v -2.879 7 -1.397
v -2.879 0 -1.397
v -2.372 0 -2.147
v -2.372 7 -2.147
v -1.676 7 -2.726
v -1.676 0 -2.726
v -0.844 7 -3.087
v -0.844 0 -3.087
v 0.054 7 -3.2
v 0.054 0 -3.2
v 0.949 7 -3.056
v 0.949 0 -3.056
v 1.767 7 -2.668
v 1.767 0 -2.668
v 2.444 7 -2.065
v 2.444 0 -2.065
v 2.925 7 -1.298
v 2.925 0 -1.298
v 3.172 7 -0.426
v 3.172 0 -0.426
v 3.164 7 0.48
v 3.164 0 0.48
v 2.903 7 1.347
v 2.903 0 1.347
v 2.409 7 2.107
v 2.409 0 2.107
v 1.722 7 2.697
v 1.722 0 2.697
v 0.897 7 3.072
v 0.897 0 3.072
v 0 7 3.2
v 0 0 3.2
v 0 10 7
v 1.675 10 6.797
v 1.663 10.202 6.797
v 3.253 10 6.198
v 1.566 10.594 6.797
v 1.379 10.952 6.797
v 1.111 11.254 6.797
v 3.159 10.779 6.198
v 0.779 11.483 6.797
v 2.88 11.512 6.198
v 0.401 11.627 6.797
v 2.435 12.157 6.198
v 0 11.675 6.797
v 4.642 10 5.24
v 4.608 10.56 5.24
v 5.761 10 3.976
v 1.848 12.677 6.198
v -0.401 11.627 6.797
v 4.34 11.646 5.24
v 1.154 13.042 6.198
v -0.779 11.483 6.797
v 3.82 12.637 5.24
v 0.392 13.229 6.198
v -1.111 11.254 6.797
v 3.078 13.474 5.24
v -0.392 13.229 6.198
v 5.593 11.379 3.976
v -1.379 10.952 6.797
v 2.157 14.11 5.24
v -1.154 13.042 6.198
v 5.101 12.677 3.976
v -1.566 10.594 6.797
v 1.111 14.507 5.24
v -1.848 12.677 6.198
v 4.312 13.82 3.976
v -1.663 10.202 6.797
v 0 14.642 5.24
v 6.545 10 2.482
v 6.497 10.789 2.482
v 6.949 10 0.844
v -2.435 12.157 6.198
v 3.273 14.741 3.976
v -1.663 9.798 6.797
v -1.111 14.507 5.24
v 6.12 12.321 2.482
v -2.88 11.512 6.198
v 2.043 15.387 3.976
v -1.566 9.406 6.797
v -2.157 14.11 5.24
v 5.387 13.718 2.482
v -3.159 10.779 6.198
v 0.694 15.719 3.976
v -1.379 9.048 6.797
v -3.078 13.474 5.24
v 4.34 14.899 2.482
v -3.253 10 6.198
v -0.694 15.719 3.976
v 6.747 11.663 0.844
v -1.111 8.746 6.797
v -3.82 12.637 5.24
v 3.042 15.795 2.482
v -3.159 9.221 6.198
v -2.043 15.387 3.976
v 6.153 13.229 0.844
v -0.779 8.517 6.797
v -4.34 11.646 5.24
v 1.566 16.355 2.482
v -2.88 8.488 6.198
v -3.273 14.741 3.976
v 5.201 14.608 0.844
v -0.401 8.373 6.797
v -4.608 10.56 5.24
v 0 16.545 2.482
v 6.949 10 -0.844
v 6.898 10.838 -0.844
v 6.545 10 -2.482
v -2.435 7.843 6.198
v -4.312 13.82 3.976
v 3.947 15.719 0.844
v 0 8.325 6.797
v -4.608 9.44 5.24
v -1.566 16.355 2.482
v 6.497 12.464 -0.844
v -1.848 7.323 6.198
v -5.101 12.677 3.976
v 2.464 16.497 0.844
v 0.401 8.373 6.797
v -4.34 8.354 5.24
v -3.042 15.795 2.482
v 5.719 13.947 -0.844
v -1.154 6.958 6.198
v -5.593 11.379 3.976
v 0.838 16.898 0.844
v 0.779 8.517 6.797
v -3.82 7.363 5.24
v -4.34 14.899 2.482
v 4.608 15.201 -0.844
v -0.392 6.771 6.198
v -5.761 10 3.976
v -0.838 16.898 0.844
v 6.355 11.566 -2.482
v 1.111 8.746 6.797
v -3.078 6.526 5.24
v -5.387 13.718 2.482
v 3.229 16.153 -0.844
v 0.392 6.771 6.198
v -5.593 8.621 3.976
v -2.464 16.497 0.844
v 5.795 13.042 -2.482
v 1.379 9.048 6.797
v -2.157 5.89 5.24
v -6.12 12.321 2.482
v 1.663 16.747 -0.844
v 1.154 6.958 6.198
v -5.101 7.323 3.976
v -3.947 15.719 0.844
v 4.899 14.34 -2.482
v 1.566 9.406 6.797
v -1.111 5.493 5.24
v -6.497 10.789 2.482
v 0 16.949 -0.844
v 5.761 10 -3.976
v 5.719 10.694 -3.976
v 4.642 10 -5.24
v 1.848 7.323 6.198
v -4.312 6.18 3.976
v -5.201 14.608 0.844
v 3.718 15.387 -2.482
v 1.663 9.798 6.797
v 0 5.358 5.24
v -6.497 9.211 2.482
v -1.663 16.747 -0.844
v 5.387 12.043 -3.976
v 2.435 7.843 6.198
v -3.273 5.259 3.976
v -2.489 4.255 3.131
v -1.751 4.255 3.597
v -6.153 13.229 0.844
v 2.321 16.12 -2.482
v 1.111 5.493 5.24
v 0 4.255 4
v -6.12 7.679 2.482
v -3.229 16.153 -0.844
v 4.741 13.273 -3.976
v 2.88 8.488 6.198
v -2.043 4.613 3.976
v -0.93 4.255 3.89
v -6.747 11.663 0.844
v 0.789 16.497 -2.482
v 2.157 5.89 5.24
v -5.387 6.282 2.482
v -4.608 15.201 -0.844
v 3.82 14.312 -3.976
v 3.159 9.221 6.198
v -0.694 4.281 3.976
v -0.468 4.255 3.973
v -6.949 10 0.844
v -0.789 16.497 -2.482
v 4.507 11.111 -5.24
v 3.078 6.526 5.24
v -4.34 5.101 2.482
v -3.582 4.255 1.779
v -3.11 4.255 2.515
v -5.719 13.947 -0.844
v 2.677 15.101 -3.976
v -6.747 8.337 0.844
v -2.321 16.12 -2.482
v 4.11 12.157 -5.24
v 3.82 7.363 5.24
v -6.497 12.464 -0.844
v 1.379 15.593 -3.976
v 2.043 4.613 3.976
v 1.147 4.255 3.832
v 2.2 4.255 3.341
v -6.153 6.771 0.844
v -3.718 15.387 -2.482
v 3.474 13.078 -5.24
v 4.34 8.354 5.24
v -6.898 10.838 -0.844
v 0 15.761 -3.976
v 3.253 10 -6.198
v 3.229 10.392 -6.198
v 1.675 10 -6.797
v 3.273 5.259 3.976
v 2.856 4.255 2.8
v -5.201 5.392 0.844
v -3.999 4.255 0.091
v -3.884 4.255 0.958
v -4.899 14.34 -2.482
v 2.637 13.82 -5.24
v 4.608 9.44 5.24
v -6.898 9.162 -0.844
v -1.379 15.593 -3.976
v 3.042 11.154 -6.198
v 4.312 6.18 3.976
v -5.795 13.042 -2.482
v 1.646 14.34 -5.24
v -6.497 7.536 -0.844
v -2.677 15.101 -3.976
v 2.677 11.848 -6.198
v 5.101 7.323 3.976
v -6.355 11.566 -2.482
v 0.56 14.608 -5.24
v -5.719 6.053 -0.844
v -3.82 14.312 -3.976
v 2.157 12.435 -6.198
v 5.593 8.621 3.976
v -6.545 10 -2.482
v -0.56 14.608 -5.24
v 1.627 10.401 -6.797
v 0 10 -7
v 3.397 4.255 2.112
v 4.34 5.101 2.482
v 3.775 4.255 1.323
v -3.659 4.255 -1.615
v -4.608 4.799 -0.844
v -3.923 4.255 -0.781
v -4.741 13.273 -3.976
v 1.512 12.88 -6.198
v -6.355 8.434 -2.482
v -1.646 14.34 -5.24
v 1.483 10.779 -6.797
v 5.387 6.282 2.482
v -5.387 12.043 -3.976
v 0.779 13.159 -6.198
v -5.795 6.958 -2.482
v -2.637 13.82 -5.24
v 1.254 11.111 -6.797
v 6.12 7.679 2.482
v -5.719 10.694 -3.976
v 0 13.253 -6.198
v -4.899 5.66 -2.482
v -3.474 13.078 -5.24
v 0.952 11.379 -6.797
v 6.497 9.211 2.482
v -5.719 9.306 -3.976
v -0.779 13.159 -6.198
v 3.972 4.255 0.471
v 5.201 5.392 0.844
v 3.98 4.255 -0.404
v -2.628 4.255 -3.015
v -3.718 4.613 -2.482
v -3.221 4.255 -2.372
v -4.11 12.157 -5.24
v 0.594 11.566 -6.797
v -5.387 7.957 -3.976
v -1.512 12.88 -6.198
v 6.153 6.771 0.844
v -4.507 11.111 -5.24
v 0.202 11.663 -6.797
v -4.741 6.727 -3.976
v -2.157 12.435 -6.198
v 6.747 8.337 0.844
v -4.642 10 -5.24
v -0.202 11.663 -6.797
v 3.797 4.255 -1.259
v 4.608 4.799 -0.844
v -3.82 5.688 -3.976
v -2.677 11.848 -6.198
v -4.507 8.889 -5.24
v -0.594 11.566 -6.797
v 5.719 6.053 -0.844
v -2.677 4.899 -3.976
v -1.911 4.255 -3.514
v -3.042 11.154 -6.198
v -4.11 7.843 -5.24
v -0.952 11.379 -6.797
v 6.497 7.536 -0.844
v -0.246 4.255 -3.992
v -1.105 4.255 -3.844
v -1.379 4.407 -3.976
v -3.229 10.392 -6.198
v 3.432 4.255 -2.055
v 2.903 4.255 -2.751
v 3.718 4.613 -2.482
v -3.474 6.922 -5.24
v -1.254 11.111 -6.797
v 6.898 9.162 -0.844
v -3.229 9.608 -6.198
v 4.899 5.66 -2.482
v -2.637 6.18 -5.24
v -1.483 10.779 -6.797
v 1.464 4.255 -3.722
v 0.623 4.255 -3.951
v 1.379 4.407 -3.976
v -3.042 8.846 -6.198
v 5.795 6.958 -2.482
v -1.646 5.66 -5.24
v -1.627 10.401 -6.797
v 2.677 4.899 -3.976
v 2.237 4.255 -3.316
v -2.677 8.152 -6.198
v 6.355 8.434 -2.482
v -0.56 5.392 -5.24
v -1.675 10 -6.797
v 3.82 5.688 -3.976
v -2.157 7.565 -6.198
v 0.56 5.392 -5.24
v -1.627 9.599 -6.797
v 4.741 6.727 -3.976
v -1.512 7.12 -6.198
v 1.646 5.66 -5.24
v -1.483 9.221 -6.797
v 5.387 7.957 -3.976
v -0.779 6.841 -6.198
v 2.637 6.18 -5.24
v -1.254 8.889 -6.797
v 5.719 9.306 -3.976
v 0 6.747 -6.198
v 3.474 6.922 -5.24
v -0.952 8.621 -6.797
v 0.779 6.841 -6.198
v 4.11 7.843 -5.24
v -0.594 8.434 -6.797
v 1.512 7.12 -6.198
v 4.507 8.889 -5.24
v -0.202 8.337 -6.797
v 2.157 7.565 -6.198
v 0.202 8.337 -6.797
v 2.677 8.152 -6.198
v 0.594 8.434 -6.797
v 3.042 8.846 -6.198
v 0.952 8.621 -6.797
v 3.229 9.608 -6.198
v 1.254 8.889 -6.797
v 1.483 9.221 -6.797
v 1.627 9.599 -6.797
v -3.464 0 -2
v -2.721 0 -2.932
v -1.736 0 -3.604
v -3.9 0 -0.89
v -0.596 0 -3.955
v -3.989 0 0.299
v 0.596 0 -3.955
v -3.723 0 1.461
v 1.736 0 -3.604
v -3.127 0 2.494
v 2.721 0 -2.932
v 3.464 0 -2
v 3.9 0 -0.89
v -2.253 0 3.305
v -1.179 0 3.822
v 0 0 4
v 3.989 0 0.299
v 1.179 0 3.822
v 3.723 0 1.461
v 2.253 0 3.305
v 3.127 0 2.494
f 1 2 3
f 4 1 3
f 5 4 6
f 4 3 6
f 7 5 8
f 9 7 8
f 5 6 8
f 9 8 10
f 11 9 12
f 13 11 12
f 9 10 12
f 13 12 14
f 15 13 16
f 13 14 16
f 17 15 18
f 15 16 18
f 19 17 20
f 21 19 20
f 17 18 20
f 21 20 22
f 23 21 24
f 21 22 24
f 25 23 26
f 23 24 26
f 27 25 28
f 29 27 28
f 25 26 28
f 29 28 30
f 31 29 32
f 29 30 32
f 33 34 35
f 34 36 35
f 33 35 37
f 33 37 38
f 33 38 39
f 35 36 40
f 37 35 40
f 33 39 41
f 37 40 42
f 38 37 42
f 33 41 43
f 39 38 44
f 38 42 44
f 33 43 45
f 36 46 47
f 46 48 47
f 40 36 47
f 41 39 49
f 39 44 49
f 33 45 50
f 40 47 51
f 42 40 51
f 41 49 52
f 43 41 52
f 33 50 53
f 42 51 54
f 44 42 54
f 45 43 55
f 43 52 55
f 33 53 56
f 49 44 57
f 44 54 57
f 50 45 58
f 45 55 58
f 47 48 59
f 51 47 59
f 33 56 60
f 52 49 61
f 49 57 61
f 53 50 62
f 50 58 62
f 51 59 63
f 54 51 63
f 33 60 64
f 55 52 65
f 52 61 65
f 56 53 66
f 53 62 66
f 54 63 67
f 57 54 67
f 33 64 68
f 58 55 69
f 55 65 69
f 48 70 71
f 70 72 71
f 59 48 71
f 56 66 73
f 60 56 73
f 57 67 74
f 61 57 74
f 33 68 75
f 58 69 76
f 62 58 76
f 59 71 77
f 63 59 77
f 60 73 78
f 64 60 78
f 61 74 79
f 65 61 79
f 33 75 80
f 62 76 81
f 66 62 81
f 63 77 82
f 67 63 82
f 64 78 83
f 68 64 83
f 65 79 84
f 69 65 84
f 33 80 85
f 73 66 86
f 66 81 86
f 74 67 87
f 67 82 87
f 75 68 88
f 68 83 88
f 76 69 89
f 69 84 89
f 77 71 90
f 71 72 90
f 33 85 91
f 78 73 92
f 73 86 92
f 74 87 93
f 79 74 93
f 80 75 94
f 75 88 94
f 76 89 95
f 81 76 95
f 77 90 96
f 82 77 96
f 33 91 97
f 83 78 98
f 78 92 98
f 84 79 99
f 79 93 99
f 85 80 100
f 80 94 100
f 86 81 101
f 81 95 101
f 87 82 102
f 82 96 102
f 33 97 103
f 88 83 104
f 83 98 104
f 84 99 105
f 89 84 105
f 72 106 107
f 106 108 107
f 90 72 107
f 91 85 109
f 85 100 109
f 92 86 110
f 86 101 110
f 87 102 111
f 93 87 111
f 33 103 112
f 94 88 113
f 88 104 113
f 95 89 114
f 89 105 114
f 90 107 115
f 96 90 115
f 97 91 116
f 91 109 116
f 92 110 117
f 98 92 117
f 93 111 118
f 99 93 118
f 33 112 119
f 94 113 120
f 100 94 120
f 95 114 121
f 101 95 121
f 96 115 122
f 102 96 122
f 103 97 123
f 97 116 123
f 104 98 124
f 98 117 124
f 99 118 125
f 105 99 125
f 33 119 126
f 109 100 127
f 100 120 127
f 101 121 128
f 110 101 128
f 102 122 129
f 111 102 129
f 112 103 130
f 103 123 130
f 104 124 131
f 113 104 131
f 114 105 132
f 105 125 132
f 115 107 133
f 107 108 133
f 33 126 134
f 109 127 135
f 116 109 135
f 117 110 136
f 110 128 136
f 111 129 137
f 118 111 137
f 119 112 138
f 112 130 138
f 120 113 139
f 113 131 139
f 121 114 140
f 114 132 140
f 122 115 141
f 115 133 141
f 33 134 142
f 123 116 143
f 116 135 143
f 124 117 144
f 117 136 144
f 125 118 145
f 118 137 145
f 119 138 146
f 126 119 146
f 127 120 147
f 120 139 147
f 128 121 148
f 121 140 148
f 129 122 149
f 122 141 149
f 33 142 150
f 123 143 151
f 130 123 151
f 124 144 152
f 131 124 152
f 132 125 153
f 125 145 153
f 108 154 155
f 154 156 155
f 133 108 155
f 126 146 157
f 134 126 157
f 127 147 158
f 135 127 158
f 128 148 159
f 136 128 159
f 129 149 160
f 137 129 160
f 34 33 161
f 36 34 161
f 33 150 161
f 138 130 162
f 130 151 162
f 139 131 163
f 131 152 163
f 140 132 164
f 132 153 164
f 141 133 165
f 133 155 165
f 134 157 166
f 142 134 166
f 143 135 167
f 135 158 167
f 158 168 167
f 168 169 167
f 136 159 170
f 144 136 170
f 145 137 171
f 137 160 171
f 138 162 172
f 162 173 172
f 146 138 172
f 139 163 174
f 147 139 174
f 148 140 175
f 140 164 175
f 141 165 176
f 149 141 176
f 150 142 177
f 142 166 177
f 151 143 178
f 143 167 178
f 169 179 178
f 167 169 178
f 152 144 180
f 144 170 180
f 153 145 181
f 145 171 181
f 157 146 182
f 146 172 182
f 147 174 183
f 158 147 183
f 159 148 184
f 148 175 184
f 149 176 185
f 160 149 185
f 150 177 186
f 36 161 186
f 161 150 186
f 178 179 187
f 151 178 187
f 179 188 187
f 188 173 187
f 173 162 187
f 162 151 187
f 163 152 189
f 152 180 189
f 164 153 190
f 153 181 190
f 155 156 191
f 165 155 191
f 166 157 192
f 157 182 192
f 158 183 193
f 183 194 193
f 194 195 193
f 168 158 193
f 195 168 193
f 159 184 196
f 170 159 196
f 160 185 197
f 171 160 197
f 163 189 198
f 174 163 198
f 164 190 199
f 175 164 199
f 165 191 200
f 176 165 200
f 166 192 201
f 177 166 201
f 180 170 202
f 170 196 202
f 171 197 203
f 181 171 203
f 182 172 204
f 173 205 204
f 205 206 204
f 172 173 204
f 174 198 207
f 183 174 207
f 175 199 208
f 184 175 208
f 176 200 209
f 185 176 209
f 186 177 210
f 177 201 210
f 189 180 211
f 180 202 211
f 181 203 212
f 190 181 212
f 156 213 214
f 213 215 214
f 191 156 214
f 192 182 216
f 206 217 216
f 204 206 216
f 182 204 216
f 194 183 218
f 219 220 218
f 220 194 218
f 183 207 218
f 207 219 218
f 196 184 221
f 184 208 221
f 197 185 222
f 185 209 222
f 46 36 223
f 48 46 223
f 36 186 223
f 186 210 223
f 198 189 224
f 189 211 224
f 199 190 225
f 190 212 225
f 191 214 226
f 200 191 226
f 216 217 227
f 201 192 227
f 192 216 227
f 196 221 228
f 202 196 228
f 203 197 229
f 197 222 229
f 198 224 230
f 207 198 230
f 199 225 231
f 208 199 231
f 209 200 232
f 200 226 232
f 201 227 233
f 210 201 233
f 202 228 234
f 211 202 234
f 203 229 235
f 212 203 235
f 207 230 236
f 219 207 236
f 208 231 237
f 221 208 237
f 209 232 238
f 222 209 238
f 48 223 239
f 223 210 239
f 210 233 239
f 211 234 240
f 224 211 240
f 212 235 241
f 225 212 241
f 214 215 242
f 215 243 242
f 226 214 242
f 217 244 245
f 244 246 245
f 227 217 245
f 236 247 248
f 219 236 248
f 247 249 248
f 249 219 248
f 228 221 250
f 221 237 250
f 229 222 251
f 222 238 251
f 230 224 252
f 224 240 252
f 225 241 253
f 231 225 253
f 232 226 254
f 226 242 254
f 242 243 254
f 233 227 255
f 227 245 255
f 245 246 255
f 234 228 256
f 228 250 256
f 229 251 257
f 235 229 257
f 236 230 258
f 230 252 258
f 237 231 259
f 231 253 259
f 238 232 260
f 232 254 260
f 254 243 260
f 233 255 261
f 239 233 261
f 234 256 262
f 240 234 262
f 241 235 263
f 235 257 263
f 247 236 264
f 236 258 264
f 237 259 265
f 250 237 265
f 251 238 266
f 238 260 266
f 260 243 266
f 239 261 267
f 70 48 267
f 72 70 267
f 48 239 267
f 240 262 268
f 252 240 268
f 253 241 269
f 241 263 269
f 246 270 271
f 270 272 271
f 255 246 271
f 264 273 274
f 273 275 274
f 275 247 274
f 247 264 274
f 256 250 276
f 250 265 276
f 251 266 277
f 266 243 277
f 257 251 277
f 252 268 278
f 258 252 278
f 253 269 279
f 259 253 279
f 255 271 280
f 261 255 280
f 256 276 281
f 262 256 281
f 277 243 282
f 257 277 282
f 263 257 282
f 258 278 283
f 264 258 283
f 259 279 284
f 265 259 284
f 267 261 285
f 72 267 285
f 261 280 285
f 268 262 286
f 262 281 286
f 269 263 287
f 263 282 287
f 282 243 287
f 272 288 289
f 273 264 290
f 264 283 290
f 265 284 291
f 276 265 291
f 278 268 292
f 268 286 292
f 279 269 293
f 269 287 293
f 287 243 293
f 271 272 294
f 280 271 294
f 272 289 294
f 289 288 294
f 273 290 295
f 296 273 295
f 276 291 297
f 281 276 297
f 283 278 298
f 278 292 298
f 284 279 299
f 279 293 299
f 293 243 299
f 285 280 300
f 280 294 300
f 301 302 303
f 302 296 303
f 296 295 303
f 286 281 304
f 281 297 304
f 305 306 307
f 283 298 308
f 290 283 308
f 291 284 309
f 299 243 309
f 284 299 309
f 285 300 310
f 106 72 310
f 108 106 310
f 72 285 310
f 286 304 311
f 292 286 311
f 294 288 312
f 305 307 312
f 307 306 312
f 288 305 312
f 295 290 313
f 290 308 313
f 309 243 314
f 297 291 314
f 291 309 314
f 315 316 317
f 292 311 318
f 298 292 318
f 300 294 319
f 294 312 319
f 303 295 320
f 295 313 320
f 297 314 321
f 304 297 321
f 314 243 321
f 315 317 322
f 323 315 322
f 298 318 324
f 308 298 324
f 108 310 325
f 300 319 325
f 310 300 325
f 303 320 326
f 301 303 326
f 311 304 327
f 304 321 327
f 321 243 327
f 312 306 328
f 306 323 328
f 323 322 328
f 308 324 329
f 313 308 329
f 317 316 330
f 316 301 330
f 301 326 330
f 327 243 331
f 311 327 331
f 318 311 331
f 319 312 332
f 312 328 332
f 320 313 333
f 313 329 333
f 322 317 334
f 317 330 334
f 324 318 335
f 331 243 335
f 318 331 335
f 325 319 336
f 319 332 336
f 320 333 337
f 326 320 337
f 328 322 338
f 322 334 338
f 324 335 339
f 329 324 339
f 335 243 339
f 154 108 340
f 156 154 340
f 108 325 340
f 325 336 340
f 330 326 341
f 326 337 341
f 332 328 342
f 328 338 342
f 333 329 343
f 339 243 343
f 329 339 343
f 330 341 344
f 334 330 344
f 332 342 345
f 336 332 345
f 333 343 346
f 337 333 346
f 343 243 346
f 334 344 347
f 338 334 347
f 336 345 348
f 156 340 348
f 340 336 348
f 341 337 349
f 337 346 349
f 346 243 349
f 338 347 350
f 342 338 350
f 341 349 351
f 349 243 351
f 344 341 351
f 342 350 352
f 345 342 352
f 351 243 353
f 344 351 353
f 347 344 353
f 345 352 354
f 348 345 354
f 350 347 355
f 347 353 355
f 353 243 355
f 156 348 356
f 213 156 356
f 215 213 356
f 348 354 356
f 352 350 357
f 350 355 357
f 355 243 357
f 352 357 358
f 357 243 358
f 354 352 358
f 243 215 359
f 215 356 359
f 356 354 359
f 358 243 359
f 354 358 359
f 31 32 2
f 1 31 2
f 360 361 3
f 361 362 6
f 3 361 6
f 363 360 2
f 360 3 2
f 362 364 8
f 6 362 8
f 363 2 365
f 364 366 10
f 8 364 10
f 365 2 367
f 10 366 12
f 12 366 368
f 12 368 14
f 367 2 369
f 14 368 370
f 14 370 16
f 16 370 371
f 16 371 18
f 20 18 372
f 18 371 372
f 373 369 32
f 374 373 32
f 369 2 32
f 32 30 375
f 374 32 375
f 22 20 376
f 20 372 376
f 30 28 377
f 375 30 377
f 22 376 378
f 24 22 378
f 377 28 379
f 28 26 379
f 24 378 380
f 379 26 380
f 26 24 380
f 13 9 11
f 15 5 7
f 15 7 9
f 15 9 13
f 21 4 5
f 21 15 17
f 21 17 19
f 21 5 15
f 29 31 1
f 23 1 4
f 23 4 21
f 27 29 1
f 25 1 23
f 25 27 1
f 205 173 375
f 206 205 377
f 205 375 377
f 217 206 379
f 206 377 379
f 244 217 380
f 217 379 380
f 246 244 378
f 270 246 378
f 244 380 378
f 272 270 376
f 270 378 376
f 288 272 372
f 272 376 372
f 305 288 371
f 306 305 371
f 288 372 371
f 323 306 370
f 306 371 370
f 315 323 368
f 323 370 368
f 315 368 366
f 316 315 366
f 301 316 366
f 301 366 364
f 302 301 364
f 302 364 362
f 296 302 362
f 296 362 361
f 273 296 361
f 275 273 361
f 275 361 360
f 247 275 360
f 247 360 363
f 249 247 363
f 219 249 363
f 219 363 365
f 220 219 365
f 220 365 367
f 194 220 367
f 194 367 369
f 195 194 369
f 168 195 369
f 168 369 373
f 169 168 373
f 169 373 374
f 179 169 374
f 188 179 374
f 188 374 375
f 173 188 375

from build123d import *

# Parameters (mm, degrees)
SKETCH_1_R          = 4
EXTRUDE_1_DEPTH     = 10
CUT_EXTRUDE_1_DEPTH = 7


with BuildPart() as part:
    # 草图1 → 凸台-拉伸1 (new body)
    with BuildSketch(Plane(origin=(0, 0, 0), x_dir=(1, 0, 0), z_dir=(0, 1, 0))):
        with Locations(Location((0, 0, 0), (0, 0, 270))):
            Circle(SKETCH_1_R)
    extrude(amount=EXTRUDE_1_DEPTH)

    # 草图2 → 旋转1 (revolve)
    with BuildSketch(Plane(origin=(0, 10, 0), x_dir=(1, 0, 0), z_dir=(0, 1, 0))):
        with BuildLine():
            Line((0, 7), (0, -7))
            ThreePointArc((0, -7), (7, 0), (0, 7))
        make_face()
    revolve(axis=Axis((0, 10, -7), (0, 0, 1)))

    # 草图3 → 切除-拉伸1 (cut)
    with BuildSketch(Plane.XZ):
        with BuildLine():
            Line((0, 3.2), (-2.879179207, -1.396541118))
            ThreePointArc((-2.879179207, -1.396541118), (2.711911833, -1.698686025), (0, 3.2))
        make_face()
    extrude(amount=-CUT_EXTRUDE_1_DEPTH, mode=Mode.SUBTRACT)


solid = part.part
